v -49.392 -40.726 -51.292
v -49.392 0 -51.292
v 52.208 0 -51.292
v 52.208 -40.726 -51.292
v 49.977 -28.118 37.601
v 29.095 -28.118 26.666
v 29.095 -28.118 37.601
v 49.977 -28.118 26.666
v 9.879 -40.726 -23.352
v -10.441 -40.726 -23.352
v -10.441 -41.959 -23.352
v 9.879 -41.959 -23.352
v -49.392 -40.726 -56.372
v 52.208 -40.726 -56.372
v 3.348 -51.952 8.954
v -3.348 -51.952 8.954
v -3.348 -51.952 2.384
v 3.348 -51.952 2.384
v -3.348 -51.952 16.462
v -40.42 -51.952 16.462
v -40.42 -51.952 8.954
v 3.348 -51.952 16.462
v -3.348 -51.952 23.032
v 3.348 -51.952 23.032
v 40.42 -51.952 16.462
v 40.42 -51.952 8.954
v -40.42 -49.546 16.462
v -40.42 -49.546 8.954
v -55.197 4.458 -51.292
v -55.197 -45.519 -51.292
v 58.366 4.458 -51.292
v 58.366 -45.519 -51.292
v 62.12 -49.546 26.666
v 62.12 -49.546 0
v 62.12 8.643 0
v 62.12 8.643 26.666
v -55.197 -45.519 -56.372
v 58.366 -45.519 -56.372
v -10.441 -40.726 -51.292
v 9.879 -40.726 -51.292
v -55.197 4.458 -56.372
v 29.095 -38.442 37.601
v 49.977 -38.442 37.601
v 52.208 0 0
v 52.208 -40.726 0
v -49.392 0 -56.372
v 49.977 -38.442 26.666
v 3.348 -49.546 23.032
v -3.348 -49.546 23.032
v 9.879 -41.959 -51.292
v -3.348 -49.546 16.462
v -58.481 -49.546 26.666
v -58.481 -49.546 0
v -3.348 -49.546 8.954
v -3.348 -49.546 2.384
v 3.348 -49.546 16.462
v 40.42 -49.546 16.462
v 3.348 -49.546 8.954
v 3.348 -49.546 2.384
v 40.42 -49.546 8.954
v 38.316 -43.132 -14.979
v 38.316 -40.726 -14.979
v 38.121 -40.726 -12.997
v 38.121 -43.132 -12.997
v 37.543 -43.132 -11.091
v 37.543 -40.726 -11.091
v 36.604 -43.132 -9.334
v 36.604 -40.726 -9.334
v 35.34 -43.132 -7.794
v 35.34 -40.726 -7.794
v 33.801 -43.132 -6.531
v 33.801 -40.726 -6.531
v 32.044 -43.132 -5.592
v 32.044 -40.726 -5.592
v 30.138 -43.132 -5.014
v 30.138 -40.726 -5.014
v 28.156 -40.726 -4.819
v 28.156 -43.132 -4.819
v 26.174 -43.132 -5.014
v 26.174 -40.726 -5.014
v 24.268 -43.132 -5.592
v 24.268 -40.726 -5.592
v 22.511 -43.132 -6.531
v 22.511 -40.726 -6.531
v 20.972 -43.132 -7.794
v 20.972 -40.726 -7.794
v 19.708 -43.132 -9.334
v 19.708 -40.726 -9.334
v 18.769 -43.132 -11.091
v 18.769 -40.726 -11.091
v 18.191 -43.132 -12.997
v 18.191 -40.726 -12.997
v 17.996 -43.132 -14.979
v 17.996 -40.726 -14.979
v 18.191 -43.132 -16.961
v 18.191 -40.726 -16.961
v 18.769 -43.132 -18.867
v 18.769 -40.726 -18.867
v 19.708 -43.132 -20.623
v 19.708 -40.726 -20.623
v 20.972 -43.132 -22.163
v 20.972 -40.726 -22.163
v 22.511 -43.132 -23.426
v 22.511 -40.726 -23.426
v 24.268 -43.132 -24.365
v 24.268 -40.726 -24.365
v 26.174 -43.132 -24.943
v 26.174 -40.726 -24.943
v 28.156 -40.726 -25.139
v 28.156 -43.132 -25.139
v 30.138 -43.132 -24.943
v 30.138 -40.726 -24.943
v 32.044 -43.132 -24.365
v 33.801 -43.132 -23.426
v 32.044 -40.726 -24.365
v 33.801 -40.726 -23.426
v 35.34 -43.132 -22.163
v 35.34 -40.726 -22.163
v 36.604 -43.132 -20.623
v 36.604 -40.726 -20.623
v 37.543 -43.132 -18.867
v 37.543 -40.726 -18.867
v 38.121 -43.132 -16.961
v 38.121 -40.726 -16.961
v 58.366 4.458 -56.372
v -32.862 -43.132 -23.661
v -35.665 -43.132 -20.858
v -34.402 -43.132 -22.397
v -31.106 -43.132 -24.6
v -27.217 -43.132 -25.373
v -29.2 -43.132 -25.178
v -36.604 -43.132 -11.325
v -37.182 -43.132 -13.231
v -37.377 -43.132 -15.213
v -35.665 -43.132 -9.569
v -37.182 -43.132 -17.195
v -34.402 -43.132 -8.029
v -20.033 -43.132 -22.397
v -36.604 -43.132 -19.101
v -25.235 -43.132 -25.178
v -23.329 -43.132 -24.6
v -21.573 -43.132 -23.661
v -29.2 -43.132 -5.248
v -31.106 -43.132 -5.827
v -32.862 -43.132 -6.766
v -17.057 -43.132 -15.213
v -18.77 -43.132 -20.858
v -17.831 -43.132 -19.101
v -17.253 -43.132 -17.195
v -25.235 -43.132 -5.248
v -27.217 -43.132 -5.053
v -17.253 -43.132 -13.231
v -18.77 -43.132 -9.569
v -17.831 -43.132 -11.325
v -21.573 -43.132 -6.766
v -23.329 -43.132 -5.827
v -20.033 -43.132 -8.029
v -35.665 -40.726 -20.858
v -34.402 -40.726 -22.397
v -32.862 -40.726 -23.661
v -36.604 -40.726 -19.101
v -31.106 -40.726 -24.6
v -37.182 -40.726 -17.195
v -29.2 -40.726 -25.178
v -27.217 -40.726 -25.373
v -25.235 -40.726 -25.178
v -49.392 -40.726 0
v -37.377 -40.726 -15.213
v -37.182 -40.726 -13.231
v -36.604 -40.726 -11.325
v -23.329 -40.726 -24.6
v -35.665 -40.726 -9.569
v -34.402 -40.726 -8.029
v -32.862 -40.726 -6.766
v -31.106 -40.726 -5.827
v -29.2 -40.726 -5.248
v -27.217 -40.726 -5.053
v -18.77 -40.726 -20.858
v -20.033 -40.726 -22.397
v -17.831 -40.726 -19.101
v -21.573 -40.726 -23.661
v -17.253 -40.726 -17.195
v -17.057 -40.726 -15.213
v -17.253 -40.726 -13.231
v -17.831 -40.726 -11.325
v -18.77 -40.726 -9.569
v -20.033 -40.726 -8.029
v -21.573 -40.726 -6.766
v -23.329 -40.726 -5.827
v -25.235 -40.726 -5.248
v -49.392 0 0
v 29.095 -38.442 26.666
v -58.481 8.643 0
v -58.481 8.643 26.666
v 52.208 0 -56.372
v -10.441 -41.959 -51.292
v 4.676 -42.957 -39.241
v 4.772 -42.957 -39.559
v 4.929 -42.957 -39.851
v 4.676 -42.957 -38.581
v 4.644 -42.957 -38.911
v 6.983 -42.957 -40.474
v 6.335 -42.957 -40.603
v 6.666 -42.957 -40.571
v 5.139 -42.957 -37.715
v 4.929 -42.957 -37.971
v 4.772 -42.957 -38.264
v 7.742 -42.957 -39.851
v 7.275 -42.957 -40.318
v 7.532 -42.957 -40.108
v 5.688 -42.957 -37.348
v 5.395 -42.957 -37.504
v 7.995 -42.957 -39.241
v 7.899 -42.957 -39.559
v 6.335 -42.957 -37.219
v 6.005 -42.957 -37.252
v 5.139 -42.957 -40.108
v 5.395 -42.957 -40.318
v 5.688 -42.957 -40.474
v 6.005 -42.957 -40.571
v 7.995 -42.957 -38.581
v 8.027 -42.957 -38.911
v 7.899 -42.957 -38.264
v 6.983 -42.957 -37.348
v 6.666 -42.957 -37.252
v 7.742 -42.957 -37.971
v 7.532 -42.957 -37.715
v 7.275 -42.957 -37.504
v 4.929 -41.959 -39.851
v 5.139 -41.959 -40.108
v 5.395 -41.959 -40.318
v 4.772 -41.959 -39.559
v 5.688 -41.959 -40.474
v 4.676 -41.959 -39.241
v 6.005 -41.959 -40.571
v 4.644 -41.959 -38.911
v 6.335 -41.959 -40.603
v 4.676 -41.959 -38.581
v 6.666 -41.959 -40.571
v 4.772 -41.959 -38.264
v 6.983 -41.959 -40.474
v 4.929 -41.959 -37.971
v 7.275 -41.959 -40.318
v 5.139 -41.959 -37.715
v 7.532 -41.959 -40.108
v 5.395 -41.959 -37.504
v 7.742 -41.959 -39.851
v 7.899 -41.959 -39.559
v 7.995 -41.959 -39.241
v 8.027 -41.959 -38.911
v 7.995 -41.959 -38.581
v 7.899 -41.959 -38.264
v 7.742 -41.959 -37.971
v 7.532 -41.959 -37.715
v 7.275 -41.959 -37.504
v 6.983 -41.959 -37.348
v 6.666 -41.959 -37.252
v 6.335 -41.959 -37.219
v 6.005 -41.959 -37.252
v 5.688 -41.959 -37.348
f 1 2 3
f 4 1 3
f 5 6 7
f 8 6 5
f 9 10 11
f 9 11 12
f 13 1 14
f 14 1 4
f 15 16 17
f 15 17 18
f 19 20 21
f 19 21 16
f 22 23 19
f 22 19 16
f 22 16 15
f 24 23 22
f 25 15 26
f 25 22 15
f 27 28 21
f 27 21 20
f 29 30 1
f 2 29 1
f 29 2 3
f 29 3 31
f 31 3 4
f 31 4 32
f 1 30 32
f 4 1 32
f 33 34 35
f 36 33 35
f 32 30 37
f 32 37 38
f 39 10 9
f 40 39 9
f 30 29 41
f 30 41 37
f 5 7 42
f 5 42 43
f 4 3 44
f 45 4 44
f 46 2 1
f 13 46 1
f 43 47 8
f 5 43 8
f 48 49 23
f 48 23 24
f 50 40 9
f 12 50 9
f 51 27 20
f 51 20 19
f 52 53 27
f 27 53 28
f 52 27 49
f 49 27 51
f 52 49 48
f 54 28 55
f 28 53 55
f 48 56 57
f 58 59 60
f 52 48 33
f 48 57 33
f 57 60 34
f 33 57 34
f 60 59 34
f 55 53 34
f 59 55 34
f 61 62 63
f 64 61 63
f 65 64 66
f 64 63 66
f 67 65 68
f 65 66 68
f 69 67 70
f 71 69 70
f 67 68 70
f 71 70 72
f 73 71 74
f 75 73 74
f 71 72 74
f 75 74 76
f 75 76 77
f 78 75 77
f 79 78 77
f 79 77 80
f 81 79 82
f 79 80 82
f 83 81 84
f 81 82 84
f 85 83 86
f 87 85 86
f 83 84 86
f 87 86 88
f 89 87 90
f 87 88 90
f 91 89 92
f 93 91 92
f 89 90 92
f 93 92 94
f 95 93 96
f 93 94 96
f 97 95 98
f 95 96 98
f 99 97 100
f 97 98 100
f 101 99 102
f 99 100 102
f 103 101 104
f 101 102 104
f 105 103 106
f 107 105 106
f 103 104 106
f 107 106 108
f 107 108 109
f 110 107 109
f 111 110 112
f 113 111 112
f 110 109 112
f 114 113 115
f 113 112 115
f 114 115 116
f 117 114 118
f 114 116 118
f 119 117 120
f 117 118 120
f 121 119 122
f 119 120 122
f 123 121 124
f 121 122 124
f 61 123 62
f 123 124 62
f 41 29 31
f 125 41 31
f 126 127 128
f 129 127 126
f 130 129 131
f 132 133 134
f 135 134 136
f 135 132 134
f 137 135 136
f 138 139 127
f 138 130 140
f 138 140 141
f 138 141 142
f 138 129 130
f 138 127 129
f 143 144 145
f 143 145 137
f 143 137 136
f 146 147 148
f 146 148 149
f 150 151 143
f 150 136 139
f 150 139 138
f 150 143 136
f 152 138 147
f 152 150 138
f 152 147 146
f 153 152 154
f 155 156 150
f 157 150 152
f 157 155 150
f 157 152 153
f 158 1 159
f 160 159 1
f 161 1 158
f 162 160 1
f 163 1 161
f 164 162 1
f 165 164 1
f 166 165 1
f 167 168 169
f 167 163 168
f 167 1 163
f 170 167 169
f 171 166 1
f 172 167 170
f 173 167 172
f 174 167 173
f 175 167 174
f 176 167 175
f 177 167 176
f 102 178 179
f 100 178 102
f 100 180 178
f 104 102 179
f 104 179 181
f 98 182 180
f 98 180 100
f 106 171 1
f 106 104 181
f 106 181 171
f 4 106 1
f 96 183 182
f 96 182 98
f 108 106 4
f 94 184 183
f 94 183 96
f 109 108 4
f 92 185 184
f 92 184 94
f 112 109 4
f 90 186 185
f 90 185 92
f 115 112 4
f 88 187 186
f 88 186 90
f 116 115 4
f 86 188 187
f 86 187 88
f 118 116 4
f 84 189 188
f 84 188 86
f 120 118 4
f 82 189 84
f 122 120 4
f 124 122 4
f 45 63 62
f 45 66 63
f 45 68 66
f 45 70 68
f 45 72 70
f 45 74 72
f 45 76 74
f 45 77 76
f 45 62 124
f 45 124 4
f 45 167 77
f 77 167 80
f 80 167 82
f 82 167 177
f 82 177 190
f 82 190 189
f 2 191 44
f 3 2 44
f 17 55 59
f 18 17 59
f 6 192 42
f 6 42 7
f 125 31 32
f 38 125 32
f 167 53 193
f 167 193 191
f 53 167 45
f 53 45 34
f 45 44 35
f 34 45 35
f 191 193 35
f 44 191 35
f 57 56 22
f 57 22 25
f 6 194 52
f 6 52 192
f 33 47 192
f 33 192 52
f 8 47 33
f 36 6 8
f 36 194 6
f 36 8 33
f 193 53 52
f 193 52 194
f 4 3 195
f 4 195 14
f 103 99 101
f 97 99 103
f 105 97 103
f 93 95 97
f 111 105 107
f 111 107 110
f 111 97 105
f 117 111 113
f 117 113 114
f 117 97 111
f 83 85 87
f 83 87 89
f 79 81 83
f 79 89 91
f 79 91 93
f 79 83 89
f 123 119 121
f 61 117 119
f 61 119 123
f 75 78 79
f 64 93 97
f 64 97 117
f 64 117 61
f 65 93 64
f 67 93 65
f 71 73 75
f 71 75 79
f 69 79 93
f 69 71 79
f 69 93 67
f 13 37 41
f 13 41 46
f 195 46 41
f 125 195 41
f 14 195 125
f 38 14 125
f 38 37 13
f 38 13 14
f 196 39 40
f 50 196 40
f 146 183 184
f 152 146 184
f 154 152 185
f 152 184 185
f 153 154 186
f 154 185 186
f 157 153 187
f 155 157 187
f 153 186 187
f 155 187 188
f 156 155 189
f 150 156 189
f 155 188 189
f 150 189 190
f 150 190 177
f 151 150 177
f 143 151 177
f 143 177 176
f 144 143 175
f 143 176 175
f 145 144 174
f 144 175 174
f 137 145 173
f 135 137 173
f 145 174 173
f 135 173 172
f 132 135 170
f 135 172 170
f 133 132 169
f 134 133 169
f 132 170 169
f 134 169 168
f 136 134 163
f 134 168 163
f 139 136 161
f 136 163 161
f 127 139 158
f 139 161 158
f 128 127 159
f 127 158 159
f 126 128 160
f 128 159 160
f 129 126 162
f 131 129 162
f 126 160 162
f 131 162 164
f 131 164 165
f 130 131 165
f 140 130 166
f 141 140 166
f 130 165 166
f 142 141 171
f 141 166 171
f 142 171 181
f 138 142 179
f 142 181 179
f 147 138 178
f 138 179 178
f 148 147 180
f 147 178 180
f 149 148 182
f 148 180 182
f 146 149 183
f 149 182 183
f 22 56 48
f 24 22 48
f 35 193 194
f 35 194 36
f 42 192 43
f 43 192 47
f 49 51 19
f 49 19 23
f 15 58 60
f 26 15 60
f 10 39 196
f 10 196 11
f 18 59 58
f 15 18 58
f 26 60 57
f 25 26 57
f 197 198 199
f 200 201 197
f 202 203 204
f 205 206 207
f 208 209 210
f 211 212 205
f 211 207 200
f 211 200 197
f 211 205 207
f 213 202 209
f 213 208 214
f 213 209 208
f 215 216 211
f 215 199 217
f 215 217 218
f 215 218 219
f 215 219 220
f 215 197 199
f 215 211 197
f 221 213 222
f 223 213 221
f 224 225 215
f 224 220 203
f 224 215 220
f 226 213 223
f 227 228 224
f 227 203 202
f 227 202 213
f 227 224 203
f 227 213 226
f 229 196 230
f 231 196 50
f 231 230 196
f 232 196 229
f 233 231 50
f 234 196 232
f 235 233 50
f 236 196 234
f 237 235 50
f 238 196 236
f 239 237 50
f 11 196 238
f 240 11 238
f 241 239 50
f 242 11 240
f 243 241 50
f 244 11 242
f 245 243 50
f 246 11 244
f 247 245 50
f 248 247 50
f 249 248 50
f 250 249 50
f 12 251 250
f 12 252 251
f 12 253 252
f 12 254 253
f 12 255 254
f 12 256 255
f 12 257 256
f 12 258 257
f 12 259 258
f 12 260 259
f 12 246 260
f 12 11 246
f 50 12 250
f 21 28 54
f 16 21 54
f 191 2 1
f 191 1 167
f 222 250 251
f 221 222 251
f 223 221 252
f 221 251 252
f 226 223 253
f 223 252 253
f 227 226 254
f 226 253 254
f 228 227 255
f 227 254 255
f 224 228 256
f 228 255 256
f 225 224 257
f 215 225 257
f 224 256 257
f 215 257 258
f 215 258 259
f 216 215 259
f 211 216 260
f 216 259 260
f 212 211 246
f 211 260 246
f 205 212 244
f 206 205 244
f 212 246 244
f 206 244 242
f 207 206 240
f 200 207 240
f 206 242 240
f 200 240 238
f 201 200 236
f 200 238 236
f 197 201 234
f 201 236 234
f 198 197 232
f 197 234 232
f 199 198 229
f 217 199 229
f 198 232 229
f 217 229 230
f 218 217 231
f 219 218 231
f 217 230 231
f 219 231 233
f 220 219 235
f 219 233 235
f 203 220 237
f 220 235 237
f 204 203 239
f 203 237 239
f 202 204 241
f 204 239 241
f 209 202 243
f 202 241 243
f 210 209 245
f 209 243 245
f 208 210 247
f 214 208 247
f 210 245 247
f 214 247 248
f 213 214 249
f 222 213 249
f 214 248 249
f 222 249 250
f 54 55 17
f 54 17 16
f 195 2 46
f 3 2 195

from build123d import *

# Parameters (mm, degrees)
F0_W      = 101.6
F0_H      = 68.58
F1_DEPTH  = 40.72618
F2_W      = 113.5625839233
F2_H      = 49.9769216403
F2_W_2    = 101.6
F2_H_2    = 40.72618
F3_DEPTH  = 5.08
F4_W      = 120.6015869975
F4_H      = 58.1890912727
F5_DEPTH  = 26.66627
F6_W      = 20.8823755383
F6_H      = 10.3238727897
F7_DEPTH  = 37.60094
F8_R      = 10.16
F9_DEPTH  = 2.40593
F10_W     = 20.32
F10_H     = 27.94
F11_DEPTH = 1.23276
F12_R     = 1.691966396
F13_DEPTH = 0.99812
F14_W     = 37.0720839128
F14_H     = 7.5082704425
F14_W_2   = 6.6950637847
F14_H_2   = 6.5697357059
F15_DEPTH = 2.40593


with BuildPart() as f1:
    # F0 (on Front) → F1 (new body)
    with BuildSketch(Plane.XZ):
        with Locations((1.4078021049, -17.0019802542)):
            Rectangle(F0_W, F0_H)
    extrude(amount=F1_DEPTH)

    # F4 (on Top) → F5 (join)
    with BuildSketch(Plane.XY):
        with Locations((1.8193461001, -20.4517780803)):
            Rectangle(F4_W, F4_H)
    extrude(amount=F5_DEPTH)

    # F6 (on Top) → F7 (join)
    with BuildSketch(Plane.XY):
        with Locations((39.5357348025, -33.2800494507)):
            Rectangle(F6_W, F6_H)
    extrude(amount=F7_DEPTH)

    # F8 (on face) → F9 (join)
    with BuildSketch(Plane.XZ.offset(40.72618)):
        with Locations((-27.21747756, -15.2132753283)):
            Circle(F8_R)
        with Locations((28.156010434, -14.9786425754)):
            Circle(F8_R)
    extrude(amount=F9_DEPTH)

    # F14 (on face) → F15 (join)
    with BuildSketch(Plane.XZ.offset(49.5463237166)):
        with Locations((-21.8835738488, 12.7081032842)):
            Rectangle(F14_W, F14_H)
        with Locations((0, 19.7471063584)):
            Rectangle(F14_W_2, F14_H_2)
        with Locations((0, 12.7081032842)):
            Rectangle(F14_W_2, F14_H)
        with Locations((21.8835738488, 12.7081032842)):
            Rectangle(F14_W, F14_H)
        with Locations((0, 5.6691002101)):
            Rectangle(F14_W_2, F14_H_2)
    extrude(amount=F15_DEPTH)


with BuildPart() as f3:
    # F2 (on face) → F3 (new body)
    with BuildSketch(Plane(origin=(0, 0, -51.2919802542), x_dir=(1, 0, 0), z_dir=(0, 0, -1))):
        with Locations((1.5847124159, 20.5304254778)):
            Rectangle(F2_W, F2_H)
        with Locations((1.4078021049, 20.36309)):
            Rectangle(F2_W_2, F2_H_2, mode=Mode.SUBTRACT)
    extrude(amount=F3_DEPTH)


with BuildPart() as f11:
    # F10 (on face) → F11 (new body)
    with BuildSketch(Plane.XZ.offset(40.72618)):
        with Locations((-0.2810042986, -37.3219802542)):
            Rectangle(F10_W, F10_H)
    extrude(amount=F11_DEPTH)

    # F12 (on face) → F13 (join)
    with BuildSketch(Plane.XZ.offset(41.95894)):
        with Locations((6.3354712911, -38.9112532139)):
            Circle(F12_R)
    extrude(amount=F13_DEPTH)


solid = Compound([f1.part, f3.part, f11.part])
